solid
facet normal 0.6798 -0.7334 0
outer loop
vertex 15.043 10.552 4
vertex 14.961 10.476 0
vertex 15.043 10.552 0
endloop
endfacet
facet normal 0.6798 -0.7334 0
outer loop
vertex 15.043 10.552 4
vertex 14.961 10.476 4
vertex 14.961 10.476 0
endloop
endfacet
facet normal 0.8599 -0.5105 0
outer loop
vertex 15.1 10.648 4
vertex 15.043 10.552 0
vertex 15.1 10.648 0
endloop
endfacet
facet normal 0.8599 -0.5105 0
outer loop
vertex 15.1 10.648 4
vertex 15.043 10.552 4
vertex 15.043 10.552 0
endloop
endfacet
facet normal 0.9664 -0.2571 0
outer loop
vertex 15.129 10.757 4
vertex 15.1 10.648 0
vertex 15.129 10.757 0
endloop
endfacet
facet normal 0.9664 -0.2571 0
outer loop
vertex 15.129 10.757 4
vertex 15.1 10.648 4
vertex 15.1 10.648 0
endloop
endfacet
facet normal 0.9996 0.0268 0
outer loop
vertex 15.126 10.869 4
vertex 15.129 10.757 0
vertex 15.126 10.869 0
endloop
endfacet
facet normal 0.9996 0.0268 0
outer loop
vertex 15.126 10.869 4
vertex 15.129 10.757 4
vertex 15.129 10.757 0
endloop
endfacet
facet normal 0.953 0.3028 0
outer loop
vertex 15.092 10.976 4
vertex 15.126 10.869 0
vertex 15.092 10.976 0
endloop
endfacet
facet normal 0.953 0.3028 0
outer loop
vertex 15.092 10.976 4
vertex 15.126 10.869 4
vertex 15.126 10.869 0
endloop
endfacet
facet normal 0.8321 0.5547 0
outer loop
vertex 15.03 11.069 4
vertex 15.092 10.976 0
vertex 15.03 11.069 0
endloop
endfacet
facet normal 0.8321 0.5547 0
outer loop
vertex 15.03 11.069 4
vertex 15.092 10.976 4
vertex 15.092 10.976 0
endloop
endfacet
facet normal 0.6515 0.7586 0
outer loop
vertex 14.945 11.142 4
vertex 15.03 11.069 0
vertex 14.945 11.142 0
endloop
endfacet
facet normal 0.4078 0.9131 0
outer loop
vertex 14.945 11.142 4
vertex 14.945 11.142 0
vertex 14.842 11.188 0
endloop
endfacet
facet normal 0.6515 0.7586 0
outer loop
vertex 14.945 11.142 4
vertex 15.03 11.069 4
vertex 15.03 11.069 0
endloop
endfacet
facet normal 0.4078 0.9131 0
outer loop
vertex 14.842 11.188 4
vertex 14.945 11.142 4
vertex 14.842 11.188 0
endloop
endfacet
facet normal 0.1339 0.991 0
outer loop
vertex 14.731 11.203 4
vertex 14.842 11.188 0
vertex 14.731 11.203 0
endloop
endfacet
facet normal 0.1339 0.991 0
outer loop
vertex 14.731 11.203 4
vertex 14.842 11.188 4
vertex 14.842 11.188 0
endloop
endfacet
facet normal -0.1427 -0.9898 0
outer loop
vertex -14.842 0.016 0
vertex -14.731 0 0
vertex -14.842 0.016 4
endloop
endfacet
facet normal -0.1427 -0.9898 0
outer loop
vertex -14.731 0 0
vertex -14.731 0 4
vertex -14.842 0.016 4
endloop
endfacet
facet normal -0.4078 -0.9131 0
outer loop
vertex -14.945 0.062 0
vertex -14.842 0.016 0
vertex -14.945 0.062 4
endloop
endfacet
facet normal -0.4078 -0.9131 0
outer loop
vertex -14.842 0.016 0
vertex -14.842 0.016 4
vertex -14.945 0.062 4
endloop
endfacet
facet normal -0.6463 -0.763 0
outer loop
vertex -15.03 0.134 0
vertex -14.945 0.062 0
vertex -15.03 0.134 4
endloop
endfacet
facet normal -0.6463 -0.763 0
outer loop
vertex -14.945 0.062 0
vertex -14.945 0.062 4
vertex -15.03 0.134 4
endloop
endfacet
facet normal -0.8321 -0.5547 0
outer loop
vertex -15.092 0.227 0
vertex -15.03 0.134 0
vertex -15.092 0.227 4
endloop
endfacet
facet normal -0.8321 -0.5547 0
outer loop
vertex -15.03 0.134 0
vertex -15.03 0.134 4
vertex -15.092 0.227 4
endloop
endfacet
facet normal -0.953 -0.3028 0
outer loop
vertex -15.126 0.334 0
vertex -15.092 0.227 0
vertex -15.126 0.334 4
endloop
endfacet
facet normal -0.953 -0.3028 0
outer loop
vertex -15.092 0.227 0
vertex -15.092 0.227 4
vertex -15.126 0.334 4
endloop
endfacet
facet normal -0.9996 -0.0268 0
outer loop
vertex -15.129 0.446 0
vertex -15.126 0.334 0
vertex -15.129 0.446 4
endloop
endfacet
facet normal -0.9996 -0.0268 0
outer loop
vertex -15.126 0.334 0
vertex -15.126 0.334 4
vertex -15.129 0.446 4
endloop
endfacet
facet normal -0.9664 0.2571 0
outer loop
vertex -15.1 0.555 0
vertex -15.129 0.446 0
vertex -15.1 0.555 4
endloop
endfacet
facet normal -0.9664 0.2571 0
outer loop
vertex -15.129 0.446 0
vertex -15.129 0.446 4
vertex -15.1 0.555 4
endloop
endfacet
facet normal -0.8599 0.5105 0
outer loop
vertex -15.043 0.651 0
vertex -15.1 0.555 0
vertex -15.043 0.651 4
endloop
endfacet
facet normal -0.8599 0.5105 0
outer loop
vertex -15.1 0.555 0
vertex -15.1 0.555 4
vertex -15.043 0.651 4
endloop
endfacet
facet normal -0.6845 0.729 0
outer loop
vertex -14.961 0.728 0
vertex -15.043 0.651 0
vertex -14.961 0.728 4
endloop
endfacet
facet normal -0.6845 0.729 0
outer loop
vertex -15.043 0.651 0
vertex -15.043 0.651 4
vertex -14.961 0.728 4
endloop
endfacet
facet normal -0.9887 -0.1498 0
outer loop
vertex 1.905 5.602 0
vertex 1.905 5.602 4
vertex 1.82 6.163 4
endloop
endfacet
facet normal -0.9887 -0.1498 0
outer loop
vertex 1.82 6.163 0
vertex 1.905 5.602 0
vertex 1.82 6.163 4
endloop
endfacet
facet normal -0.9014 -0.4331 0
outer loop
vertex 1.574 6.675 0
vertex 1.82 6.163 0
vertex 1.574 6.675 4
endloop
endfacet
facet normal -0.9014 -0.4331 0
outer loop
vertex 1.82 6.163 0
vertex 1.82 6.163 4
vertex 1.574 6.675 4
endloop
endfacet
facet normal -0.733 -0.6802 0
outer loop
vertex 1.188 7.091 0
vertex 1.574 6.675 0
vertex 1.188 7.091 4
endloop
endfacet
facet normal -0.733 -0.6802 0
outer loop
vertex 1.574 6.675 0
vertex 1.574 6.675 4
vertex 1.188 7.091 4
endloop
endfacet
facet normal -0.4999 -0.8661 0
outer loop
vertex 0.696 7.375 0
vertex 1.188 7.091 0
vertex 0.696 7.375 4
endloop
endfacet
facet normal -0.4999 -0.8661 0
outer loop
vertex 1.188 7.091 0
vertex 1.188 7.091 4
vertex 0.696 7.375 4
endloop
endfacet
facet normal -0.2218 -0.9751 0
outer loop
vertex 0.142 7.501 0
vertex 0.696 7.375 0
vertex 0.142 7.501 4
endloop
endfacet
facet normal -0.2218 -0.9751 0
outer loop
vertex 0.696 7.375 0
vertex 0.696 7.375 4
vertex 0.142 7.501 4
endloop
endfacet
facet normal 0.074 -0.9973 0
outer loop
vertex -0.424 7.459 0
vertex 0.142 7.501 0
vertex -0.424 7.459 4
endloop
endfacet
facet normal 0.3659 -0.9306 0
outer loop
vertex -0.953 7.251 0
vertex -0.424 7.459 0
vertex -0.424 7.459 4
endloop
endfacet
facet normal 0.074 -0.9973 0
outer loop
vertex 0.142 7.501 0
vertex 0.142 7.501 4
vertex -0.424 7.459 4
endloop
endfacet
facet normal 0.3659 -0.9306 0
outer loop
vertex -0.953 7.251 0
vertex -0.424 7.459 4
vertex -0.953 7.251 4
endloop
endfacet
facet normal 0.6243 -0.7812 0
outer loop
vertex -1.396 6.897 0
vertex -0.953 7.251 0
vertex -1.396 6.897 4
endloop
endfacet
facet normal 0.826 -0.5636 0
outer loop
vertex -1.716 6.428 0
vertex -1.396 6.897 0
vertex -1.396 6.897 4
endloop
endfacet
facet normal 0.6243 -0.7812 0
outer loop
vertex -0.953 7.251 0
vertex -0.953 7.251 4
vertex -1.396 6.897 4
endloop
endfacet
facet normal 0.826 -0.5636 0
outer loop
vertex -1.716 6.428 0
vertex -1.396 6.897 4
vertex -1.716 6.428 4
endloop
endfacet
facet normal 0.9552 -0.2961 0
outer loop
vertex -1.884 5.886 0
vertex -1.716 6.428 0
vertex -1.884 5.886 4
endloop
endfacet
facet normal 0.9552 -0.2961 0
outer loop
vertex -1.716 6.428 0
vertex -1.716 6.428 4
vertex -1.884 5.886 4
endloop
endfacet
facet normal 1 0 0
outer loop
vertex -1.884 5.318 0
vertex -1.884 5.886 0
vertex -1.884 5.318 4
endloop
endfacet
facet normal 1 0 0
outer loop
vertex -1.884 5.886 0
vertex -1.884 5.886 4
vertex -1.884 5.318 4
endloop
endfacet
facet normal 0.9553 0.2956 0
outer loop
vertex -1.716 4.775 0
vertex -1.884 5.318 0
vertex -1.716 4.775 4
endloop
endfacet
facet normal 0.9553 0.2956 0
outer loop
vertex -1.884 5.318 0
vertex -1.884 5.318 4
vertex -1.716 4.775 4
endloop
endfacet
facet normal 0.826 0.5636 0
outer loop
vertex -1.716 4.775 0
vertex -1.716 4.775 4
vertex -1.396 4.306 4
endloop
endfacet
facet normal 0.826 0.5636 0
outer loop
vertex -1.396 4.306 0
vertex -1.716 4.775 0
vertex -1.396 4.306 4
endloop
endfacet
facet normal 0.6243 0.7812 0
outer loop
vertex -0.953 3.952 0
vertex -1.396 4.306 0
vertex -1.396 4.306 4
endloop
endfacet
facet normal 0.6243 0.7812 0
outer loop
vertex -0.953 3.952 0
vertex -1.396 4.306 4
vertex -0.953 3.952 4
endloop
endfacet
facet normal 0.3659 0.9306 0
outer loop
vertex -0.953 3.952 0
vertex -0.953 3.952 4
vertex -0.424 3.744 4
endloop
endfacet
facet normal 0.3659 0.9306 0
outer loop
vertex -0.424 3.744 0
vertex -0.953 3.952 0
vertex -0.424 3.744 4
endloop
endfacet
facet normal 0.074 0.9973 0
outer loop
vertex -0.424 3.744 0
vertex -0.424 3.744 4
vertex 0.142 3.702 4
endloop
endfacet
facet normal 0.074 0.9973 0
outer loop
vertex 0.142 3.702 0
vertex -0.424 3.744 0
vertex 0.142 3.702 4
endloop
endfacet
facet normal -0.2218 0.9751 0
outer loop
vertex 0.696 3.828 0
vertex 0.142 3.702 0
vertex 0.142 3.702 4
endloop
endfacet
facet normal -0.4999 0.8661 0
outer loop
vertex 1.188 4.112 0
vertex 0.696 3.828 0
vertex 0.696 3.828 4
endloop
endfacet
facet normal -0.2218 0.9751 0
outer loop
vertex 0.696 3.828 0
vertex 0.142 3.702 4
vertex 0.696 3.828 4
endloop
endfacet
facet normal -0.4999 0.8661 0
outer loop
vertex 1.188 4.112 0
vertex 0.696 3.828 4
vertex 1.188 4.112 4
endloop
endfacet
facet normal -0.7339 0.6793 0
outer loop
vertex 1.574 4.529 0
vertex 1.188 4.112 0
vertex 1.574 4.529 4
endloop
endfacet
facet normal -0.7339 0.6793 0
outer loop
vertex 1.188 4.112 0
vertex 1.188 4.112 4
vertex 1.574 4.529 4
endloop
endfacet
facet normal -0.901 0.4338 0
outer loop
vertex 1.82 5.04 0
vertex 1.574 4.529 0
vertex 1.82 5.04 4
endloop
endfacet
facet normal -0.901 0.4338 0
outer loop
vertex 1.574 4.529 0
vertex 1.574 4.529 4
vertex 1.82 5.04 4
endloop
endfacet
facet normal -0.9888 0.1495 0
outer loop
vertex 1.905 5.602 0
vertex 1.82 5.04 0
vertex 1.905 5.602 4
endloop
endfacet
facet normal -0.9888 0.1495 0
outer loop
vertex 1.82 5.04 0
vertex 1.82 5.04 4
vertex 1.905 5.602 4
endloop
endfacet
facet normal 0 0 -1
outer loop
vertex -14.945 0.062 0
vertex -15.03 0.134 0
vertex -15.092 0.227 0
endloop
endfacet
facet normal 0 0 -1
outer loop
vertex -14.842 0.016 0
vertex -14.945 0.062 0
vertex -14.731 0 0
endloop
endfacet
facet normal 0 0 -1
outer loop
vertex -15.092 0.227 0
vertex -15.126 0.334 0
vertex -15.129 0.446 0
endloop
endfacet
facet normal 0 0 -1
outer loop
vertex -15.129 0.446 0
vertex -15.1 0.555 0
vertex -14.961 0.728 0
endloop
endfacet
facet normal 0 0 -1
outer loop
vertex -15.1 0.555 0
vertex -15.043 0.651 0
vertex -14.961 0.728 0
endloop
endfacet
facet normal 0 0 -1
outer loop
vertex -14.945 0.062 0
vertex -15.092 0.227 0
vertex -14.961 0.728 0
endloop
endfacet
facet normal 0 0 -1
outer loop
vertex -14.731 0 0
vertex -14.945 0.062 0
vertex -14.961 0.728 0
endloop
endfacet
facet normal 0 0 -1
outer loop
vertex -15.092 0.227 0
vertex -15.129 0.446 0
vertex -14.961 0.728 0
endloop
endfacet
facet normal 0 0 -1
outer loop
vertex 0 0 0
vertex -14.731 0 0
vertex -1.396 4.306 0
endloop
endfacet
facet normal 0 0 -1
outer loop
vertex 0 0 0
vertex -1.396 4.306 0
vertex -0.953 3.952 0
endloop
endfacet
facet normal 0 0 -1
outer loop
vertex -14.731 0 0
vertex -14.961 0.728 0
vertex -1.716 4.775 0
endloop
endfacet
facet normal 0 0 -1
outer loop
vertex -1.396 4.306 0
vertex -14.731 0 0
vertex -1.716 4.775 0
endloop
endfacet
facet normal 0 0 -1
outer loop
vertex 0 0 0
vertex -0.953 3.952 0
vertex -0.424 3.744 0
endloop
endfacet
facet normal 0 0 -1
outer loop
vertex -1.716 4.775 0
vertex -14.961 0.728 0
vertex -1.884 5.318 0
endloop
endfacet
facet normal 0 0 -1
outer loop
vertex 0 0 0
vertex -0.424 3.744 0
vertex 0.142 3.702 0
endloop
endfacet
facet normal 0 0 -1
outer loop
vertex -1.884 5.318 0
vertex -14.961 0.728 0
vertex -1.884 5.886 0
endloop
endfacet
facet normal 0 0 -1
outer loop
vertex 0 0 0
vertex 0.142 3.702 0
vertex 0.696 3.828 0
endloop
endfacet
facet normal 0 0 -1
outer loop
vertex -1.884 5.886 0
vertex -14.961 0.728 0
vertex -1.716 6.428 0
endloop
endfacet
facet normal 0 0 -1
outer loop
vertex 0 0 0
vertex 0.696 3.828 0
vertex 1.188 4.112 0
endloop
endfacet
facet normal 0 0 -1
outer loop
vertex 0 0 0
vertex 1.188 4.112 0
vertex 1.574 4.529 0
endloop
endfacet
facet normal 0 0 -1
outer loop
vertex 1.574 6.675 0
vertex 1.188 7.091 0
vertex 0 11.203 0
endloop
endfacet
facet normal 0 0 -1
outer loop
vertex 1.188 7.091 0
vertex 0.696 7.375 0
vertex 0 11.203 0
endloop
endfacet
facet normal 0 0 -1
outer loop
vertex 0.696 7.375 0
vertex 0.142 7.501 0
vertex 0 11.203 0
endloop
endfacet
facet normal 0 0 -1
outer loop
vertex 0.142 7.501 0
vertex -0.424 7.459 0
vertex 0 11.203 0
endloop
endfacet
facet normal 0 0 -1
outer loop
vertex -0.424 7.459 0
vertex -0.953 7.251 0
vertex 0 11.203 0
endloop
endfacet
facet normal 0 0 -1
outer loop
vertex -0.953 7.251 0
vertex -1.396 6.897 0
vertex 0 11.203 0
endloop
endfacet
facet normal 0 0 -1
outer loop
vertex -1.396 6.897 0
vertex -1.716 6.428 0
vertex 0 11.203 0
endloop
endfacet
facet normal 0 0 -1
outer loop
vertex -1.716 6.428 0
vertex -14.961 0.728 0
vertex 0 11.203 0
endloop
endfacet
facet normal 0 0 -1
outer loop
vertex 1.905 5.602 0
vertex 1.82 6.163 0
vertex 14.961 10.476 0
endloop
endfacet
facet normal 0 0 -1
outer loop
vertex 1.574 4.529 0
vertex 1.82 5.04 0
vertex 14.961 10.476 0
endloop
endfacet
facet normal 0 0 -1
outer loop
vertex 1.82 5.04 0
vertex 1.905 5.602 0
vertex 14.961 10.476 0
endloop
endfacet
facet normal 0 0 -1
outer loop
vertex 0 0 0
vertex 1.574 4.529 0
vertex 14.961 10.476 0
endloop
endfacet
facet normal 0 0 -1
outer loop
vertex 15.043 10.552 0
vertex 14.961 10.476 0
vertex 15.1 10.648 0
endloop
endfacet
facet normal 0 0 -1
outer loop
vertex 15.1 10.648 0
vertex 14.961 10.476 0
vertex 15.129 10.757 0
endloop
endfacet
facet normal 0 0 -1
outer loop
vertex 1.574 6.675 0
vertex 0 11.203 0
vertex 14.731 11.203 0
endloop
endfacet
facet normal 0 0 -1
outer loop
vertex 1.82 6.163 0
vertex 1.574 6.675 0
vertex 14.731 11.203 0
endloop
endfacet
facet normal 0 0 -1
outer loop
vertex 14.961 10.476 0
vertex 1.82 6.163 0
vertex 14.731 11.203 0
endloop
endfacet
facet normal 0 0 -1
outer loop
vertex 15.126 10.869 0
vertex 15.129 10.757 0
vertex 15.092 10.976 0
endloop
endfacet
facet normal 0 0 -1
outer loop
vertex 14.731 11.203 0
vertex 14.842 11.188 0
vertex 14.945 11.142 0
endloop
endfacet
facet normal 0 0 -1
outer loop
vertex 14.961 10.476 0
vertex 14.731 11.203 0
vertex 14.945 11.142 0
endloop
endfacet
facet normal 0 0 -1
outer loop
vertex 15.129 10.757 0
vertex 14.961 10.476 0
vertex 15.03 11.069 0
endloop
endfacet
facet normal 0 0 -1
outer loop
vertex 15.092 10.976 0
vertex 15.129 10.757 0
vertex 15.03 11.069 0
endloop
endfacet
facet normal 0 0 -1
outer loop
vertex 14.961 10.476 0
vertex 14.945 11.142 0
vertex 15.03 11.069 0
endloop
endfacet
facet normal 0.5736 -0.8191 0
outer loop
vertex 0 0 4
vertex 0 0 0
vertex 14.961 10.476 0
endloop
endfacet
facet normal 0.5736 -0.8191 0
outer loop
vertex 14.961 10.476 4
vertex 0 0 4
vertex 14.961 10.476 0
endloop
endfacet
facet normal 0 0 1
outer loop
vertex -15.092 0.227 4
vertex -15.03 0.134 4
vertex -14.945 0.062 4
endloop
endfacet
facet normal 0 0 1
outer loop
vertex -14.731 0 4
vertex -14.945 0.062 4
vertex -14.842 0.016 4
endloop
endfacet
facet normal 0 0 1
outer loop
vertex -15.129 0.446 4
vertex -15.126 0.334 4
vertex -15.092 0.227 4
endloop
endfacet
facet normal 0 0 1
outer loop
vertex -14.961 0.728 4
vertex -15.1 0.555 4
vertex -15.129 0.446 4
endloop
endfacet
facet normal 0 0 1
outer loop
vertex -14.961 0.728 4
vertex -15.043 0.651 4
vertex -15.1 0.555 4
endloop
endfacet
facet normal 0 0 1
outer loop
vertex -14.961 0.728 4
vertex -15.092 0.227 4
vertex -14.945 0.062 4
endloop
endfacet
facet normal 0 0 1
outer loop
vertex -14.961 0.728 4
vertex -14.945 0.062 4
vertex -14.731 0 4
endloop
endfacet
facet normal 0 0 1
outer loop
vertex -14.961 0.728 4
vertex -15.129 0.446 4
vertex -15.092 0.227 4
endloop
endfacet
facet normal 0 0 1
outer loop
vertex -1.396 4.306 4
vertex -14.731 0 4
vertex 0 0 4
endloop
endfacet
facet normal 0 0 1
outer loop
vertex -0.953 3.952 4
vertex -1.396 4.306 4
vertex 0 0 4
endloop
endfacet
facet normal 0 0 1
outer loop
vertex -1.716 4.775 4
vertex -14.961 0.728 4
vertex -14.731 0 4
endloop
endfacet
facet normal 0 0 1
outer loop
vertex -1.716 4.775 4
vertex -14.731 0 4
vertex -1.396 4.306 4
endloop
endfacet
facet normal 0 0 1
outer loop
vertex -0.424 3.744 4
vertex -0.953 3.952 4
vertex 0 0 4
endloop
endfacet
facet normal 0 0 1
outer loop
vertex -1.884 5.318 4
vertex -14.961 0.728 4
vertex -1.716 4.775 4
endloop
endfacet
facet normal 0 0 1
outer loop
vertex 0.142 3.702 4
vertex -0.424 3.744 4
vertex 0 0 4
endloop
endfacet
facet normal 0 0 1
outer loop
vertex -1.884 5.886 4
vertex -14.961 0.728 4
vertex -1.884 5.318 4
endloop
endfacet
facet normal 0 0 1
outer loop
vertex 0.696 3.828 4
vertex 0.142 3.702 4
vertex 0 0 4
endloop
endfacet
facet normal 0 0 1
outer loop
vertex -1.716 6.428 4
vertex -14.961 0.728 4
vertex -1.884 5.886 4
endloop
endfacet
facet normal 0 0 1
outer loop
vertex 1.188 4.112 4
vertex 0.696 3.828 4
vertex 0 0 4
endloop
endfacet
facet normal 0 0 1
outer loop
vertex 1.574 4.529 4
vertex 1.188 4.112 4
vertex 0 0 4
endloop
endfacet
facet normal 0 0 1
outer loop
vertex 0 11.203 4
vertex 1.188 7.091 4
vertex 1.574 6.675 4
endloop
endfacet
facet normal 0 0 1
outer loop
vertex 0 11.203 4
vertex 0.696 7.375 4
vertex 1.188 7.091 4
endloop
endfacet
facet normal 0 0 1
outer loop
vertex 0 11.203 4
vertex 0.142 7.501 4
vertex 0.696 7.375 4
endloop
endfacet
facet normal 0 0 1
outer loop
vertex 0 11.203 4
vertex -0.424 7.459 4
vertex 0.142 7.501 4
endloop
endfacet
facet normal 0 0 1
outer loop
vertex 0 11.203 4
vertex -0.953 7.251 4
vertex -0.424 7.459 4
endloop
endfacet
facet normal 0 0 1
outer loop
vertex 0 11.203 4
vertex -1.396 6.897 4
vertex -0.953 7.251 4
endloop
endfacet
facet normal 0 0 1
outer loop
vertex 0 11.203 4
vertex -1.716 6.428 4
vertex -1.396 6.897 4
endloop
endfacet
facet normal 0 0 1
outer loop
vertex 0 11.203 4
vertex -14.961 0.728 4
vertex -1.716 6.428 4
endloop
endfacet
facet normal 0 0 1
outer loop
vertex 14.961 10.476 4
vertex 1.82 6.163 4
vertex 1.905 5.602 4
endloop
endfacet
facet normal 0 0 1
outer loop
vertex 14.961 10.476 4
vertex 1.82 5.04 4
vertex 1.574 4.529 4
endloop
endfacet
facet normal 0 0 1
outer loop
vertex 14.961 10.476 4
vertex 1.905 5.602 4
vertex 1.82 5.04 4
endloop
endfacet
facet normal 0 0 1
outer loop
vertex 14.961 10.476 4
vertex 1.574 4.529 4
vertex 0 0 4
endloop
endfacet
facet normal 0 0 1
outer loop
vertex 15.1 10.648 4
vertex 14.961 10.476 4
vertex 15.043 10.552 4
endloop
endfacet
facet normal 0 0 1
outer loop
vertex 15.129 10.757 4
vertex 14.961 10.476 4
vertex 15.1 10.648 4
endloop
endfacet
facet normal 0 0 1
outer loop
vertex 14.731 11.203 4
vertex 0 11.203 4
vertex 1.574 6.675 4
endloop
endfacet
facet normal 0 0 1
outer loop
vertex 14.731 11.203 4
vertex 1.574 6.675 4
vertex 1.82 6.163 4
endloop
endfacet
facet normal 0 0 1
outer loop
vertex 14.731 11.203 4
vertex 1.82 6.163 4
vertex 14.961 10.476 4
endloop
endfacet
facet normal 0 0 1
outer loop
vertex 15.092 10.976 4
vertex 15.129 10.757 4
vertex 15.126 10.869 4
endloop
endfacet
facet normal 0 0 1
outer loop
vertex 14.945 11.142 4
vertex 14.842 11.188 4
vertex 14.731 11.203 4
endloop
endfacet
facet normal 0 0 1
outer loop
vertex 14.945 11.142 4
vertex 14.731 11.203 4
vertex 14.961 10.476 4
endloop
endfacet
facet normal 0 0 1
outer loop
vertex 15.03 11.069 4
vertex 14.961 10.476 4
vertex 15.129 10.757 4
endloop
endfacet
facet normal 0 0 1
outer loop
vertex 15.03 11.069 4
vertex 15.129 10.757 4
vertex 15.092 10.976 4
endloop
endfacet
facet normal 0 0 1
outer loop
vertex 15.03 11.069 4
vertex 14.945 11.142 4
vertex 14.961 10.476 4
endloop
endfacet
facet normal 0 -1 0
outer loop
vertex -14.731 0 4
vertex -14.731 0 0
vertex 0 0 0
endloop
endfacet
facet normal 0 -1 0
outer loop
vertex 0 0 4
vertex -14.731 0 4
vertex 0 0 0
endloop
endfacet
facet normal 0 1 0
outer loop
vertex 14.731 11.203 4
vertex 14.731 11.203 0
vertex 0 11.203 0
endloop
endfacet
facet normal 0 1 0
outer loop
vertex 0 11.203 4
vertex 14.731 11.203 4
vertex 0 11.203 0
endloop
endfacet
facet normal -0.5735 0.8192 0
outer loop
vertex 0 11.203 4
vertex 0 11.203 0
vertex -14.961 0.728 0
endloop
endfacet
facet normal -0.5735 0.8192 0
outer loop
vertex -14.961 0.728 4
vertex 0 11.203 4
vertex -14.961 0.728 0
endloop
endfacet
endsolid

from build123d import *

# Parameters (mm, degrees)
F1_DEPTH = 4
F2_R     = 0.4
F3_R     = 1.905
F4_DEPTH = 4


with BuildPart() as f1:
    # F0 (on Top) → F1 (new body)
    with BuildSketch(Plane.XY):
        Polygon((-16, 0), (0, 0), (16, 11.203321), (0, 11.203321), align=None)
    extrude(amount=F1_DEPTH)

    # F2
    f2_edges = [f1.edges().sort_by_distance(p)[0] for p in [
        (-16, 0, 2),
        (16, 11.203321, 2),
    ]]
    fillet(f2_edges, radius=F2_R)

    # F3 (on face) → F4 (cut, through all)
    with BuildSketch(Plane.XY.offset(4)):
        with Locations((0, 5.60166)):
            Circle(F3_R)
    extrude(amount=-F4_DEPTH, mode=Mode.SUBTRACT)


solid = f1.part
